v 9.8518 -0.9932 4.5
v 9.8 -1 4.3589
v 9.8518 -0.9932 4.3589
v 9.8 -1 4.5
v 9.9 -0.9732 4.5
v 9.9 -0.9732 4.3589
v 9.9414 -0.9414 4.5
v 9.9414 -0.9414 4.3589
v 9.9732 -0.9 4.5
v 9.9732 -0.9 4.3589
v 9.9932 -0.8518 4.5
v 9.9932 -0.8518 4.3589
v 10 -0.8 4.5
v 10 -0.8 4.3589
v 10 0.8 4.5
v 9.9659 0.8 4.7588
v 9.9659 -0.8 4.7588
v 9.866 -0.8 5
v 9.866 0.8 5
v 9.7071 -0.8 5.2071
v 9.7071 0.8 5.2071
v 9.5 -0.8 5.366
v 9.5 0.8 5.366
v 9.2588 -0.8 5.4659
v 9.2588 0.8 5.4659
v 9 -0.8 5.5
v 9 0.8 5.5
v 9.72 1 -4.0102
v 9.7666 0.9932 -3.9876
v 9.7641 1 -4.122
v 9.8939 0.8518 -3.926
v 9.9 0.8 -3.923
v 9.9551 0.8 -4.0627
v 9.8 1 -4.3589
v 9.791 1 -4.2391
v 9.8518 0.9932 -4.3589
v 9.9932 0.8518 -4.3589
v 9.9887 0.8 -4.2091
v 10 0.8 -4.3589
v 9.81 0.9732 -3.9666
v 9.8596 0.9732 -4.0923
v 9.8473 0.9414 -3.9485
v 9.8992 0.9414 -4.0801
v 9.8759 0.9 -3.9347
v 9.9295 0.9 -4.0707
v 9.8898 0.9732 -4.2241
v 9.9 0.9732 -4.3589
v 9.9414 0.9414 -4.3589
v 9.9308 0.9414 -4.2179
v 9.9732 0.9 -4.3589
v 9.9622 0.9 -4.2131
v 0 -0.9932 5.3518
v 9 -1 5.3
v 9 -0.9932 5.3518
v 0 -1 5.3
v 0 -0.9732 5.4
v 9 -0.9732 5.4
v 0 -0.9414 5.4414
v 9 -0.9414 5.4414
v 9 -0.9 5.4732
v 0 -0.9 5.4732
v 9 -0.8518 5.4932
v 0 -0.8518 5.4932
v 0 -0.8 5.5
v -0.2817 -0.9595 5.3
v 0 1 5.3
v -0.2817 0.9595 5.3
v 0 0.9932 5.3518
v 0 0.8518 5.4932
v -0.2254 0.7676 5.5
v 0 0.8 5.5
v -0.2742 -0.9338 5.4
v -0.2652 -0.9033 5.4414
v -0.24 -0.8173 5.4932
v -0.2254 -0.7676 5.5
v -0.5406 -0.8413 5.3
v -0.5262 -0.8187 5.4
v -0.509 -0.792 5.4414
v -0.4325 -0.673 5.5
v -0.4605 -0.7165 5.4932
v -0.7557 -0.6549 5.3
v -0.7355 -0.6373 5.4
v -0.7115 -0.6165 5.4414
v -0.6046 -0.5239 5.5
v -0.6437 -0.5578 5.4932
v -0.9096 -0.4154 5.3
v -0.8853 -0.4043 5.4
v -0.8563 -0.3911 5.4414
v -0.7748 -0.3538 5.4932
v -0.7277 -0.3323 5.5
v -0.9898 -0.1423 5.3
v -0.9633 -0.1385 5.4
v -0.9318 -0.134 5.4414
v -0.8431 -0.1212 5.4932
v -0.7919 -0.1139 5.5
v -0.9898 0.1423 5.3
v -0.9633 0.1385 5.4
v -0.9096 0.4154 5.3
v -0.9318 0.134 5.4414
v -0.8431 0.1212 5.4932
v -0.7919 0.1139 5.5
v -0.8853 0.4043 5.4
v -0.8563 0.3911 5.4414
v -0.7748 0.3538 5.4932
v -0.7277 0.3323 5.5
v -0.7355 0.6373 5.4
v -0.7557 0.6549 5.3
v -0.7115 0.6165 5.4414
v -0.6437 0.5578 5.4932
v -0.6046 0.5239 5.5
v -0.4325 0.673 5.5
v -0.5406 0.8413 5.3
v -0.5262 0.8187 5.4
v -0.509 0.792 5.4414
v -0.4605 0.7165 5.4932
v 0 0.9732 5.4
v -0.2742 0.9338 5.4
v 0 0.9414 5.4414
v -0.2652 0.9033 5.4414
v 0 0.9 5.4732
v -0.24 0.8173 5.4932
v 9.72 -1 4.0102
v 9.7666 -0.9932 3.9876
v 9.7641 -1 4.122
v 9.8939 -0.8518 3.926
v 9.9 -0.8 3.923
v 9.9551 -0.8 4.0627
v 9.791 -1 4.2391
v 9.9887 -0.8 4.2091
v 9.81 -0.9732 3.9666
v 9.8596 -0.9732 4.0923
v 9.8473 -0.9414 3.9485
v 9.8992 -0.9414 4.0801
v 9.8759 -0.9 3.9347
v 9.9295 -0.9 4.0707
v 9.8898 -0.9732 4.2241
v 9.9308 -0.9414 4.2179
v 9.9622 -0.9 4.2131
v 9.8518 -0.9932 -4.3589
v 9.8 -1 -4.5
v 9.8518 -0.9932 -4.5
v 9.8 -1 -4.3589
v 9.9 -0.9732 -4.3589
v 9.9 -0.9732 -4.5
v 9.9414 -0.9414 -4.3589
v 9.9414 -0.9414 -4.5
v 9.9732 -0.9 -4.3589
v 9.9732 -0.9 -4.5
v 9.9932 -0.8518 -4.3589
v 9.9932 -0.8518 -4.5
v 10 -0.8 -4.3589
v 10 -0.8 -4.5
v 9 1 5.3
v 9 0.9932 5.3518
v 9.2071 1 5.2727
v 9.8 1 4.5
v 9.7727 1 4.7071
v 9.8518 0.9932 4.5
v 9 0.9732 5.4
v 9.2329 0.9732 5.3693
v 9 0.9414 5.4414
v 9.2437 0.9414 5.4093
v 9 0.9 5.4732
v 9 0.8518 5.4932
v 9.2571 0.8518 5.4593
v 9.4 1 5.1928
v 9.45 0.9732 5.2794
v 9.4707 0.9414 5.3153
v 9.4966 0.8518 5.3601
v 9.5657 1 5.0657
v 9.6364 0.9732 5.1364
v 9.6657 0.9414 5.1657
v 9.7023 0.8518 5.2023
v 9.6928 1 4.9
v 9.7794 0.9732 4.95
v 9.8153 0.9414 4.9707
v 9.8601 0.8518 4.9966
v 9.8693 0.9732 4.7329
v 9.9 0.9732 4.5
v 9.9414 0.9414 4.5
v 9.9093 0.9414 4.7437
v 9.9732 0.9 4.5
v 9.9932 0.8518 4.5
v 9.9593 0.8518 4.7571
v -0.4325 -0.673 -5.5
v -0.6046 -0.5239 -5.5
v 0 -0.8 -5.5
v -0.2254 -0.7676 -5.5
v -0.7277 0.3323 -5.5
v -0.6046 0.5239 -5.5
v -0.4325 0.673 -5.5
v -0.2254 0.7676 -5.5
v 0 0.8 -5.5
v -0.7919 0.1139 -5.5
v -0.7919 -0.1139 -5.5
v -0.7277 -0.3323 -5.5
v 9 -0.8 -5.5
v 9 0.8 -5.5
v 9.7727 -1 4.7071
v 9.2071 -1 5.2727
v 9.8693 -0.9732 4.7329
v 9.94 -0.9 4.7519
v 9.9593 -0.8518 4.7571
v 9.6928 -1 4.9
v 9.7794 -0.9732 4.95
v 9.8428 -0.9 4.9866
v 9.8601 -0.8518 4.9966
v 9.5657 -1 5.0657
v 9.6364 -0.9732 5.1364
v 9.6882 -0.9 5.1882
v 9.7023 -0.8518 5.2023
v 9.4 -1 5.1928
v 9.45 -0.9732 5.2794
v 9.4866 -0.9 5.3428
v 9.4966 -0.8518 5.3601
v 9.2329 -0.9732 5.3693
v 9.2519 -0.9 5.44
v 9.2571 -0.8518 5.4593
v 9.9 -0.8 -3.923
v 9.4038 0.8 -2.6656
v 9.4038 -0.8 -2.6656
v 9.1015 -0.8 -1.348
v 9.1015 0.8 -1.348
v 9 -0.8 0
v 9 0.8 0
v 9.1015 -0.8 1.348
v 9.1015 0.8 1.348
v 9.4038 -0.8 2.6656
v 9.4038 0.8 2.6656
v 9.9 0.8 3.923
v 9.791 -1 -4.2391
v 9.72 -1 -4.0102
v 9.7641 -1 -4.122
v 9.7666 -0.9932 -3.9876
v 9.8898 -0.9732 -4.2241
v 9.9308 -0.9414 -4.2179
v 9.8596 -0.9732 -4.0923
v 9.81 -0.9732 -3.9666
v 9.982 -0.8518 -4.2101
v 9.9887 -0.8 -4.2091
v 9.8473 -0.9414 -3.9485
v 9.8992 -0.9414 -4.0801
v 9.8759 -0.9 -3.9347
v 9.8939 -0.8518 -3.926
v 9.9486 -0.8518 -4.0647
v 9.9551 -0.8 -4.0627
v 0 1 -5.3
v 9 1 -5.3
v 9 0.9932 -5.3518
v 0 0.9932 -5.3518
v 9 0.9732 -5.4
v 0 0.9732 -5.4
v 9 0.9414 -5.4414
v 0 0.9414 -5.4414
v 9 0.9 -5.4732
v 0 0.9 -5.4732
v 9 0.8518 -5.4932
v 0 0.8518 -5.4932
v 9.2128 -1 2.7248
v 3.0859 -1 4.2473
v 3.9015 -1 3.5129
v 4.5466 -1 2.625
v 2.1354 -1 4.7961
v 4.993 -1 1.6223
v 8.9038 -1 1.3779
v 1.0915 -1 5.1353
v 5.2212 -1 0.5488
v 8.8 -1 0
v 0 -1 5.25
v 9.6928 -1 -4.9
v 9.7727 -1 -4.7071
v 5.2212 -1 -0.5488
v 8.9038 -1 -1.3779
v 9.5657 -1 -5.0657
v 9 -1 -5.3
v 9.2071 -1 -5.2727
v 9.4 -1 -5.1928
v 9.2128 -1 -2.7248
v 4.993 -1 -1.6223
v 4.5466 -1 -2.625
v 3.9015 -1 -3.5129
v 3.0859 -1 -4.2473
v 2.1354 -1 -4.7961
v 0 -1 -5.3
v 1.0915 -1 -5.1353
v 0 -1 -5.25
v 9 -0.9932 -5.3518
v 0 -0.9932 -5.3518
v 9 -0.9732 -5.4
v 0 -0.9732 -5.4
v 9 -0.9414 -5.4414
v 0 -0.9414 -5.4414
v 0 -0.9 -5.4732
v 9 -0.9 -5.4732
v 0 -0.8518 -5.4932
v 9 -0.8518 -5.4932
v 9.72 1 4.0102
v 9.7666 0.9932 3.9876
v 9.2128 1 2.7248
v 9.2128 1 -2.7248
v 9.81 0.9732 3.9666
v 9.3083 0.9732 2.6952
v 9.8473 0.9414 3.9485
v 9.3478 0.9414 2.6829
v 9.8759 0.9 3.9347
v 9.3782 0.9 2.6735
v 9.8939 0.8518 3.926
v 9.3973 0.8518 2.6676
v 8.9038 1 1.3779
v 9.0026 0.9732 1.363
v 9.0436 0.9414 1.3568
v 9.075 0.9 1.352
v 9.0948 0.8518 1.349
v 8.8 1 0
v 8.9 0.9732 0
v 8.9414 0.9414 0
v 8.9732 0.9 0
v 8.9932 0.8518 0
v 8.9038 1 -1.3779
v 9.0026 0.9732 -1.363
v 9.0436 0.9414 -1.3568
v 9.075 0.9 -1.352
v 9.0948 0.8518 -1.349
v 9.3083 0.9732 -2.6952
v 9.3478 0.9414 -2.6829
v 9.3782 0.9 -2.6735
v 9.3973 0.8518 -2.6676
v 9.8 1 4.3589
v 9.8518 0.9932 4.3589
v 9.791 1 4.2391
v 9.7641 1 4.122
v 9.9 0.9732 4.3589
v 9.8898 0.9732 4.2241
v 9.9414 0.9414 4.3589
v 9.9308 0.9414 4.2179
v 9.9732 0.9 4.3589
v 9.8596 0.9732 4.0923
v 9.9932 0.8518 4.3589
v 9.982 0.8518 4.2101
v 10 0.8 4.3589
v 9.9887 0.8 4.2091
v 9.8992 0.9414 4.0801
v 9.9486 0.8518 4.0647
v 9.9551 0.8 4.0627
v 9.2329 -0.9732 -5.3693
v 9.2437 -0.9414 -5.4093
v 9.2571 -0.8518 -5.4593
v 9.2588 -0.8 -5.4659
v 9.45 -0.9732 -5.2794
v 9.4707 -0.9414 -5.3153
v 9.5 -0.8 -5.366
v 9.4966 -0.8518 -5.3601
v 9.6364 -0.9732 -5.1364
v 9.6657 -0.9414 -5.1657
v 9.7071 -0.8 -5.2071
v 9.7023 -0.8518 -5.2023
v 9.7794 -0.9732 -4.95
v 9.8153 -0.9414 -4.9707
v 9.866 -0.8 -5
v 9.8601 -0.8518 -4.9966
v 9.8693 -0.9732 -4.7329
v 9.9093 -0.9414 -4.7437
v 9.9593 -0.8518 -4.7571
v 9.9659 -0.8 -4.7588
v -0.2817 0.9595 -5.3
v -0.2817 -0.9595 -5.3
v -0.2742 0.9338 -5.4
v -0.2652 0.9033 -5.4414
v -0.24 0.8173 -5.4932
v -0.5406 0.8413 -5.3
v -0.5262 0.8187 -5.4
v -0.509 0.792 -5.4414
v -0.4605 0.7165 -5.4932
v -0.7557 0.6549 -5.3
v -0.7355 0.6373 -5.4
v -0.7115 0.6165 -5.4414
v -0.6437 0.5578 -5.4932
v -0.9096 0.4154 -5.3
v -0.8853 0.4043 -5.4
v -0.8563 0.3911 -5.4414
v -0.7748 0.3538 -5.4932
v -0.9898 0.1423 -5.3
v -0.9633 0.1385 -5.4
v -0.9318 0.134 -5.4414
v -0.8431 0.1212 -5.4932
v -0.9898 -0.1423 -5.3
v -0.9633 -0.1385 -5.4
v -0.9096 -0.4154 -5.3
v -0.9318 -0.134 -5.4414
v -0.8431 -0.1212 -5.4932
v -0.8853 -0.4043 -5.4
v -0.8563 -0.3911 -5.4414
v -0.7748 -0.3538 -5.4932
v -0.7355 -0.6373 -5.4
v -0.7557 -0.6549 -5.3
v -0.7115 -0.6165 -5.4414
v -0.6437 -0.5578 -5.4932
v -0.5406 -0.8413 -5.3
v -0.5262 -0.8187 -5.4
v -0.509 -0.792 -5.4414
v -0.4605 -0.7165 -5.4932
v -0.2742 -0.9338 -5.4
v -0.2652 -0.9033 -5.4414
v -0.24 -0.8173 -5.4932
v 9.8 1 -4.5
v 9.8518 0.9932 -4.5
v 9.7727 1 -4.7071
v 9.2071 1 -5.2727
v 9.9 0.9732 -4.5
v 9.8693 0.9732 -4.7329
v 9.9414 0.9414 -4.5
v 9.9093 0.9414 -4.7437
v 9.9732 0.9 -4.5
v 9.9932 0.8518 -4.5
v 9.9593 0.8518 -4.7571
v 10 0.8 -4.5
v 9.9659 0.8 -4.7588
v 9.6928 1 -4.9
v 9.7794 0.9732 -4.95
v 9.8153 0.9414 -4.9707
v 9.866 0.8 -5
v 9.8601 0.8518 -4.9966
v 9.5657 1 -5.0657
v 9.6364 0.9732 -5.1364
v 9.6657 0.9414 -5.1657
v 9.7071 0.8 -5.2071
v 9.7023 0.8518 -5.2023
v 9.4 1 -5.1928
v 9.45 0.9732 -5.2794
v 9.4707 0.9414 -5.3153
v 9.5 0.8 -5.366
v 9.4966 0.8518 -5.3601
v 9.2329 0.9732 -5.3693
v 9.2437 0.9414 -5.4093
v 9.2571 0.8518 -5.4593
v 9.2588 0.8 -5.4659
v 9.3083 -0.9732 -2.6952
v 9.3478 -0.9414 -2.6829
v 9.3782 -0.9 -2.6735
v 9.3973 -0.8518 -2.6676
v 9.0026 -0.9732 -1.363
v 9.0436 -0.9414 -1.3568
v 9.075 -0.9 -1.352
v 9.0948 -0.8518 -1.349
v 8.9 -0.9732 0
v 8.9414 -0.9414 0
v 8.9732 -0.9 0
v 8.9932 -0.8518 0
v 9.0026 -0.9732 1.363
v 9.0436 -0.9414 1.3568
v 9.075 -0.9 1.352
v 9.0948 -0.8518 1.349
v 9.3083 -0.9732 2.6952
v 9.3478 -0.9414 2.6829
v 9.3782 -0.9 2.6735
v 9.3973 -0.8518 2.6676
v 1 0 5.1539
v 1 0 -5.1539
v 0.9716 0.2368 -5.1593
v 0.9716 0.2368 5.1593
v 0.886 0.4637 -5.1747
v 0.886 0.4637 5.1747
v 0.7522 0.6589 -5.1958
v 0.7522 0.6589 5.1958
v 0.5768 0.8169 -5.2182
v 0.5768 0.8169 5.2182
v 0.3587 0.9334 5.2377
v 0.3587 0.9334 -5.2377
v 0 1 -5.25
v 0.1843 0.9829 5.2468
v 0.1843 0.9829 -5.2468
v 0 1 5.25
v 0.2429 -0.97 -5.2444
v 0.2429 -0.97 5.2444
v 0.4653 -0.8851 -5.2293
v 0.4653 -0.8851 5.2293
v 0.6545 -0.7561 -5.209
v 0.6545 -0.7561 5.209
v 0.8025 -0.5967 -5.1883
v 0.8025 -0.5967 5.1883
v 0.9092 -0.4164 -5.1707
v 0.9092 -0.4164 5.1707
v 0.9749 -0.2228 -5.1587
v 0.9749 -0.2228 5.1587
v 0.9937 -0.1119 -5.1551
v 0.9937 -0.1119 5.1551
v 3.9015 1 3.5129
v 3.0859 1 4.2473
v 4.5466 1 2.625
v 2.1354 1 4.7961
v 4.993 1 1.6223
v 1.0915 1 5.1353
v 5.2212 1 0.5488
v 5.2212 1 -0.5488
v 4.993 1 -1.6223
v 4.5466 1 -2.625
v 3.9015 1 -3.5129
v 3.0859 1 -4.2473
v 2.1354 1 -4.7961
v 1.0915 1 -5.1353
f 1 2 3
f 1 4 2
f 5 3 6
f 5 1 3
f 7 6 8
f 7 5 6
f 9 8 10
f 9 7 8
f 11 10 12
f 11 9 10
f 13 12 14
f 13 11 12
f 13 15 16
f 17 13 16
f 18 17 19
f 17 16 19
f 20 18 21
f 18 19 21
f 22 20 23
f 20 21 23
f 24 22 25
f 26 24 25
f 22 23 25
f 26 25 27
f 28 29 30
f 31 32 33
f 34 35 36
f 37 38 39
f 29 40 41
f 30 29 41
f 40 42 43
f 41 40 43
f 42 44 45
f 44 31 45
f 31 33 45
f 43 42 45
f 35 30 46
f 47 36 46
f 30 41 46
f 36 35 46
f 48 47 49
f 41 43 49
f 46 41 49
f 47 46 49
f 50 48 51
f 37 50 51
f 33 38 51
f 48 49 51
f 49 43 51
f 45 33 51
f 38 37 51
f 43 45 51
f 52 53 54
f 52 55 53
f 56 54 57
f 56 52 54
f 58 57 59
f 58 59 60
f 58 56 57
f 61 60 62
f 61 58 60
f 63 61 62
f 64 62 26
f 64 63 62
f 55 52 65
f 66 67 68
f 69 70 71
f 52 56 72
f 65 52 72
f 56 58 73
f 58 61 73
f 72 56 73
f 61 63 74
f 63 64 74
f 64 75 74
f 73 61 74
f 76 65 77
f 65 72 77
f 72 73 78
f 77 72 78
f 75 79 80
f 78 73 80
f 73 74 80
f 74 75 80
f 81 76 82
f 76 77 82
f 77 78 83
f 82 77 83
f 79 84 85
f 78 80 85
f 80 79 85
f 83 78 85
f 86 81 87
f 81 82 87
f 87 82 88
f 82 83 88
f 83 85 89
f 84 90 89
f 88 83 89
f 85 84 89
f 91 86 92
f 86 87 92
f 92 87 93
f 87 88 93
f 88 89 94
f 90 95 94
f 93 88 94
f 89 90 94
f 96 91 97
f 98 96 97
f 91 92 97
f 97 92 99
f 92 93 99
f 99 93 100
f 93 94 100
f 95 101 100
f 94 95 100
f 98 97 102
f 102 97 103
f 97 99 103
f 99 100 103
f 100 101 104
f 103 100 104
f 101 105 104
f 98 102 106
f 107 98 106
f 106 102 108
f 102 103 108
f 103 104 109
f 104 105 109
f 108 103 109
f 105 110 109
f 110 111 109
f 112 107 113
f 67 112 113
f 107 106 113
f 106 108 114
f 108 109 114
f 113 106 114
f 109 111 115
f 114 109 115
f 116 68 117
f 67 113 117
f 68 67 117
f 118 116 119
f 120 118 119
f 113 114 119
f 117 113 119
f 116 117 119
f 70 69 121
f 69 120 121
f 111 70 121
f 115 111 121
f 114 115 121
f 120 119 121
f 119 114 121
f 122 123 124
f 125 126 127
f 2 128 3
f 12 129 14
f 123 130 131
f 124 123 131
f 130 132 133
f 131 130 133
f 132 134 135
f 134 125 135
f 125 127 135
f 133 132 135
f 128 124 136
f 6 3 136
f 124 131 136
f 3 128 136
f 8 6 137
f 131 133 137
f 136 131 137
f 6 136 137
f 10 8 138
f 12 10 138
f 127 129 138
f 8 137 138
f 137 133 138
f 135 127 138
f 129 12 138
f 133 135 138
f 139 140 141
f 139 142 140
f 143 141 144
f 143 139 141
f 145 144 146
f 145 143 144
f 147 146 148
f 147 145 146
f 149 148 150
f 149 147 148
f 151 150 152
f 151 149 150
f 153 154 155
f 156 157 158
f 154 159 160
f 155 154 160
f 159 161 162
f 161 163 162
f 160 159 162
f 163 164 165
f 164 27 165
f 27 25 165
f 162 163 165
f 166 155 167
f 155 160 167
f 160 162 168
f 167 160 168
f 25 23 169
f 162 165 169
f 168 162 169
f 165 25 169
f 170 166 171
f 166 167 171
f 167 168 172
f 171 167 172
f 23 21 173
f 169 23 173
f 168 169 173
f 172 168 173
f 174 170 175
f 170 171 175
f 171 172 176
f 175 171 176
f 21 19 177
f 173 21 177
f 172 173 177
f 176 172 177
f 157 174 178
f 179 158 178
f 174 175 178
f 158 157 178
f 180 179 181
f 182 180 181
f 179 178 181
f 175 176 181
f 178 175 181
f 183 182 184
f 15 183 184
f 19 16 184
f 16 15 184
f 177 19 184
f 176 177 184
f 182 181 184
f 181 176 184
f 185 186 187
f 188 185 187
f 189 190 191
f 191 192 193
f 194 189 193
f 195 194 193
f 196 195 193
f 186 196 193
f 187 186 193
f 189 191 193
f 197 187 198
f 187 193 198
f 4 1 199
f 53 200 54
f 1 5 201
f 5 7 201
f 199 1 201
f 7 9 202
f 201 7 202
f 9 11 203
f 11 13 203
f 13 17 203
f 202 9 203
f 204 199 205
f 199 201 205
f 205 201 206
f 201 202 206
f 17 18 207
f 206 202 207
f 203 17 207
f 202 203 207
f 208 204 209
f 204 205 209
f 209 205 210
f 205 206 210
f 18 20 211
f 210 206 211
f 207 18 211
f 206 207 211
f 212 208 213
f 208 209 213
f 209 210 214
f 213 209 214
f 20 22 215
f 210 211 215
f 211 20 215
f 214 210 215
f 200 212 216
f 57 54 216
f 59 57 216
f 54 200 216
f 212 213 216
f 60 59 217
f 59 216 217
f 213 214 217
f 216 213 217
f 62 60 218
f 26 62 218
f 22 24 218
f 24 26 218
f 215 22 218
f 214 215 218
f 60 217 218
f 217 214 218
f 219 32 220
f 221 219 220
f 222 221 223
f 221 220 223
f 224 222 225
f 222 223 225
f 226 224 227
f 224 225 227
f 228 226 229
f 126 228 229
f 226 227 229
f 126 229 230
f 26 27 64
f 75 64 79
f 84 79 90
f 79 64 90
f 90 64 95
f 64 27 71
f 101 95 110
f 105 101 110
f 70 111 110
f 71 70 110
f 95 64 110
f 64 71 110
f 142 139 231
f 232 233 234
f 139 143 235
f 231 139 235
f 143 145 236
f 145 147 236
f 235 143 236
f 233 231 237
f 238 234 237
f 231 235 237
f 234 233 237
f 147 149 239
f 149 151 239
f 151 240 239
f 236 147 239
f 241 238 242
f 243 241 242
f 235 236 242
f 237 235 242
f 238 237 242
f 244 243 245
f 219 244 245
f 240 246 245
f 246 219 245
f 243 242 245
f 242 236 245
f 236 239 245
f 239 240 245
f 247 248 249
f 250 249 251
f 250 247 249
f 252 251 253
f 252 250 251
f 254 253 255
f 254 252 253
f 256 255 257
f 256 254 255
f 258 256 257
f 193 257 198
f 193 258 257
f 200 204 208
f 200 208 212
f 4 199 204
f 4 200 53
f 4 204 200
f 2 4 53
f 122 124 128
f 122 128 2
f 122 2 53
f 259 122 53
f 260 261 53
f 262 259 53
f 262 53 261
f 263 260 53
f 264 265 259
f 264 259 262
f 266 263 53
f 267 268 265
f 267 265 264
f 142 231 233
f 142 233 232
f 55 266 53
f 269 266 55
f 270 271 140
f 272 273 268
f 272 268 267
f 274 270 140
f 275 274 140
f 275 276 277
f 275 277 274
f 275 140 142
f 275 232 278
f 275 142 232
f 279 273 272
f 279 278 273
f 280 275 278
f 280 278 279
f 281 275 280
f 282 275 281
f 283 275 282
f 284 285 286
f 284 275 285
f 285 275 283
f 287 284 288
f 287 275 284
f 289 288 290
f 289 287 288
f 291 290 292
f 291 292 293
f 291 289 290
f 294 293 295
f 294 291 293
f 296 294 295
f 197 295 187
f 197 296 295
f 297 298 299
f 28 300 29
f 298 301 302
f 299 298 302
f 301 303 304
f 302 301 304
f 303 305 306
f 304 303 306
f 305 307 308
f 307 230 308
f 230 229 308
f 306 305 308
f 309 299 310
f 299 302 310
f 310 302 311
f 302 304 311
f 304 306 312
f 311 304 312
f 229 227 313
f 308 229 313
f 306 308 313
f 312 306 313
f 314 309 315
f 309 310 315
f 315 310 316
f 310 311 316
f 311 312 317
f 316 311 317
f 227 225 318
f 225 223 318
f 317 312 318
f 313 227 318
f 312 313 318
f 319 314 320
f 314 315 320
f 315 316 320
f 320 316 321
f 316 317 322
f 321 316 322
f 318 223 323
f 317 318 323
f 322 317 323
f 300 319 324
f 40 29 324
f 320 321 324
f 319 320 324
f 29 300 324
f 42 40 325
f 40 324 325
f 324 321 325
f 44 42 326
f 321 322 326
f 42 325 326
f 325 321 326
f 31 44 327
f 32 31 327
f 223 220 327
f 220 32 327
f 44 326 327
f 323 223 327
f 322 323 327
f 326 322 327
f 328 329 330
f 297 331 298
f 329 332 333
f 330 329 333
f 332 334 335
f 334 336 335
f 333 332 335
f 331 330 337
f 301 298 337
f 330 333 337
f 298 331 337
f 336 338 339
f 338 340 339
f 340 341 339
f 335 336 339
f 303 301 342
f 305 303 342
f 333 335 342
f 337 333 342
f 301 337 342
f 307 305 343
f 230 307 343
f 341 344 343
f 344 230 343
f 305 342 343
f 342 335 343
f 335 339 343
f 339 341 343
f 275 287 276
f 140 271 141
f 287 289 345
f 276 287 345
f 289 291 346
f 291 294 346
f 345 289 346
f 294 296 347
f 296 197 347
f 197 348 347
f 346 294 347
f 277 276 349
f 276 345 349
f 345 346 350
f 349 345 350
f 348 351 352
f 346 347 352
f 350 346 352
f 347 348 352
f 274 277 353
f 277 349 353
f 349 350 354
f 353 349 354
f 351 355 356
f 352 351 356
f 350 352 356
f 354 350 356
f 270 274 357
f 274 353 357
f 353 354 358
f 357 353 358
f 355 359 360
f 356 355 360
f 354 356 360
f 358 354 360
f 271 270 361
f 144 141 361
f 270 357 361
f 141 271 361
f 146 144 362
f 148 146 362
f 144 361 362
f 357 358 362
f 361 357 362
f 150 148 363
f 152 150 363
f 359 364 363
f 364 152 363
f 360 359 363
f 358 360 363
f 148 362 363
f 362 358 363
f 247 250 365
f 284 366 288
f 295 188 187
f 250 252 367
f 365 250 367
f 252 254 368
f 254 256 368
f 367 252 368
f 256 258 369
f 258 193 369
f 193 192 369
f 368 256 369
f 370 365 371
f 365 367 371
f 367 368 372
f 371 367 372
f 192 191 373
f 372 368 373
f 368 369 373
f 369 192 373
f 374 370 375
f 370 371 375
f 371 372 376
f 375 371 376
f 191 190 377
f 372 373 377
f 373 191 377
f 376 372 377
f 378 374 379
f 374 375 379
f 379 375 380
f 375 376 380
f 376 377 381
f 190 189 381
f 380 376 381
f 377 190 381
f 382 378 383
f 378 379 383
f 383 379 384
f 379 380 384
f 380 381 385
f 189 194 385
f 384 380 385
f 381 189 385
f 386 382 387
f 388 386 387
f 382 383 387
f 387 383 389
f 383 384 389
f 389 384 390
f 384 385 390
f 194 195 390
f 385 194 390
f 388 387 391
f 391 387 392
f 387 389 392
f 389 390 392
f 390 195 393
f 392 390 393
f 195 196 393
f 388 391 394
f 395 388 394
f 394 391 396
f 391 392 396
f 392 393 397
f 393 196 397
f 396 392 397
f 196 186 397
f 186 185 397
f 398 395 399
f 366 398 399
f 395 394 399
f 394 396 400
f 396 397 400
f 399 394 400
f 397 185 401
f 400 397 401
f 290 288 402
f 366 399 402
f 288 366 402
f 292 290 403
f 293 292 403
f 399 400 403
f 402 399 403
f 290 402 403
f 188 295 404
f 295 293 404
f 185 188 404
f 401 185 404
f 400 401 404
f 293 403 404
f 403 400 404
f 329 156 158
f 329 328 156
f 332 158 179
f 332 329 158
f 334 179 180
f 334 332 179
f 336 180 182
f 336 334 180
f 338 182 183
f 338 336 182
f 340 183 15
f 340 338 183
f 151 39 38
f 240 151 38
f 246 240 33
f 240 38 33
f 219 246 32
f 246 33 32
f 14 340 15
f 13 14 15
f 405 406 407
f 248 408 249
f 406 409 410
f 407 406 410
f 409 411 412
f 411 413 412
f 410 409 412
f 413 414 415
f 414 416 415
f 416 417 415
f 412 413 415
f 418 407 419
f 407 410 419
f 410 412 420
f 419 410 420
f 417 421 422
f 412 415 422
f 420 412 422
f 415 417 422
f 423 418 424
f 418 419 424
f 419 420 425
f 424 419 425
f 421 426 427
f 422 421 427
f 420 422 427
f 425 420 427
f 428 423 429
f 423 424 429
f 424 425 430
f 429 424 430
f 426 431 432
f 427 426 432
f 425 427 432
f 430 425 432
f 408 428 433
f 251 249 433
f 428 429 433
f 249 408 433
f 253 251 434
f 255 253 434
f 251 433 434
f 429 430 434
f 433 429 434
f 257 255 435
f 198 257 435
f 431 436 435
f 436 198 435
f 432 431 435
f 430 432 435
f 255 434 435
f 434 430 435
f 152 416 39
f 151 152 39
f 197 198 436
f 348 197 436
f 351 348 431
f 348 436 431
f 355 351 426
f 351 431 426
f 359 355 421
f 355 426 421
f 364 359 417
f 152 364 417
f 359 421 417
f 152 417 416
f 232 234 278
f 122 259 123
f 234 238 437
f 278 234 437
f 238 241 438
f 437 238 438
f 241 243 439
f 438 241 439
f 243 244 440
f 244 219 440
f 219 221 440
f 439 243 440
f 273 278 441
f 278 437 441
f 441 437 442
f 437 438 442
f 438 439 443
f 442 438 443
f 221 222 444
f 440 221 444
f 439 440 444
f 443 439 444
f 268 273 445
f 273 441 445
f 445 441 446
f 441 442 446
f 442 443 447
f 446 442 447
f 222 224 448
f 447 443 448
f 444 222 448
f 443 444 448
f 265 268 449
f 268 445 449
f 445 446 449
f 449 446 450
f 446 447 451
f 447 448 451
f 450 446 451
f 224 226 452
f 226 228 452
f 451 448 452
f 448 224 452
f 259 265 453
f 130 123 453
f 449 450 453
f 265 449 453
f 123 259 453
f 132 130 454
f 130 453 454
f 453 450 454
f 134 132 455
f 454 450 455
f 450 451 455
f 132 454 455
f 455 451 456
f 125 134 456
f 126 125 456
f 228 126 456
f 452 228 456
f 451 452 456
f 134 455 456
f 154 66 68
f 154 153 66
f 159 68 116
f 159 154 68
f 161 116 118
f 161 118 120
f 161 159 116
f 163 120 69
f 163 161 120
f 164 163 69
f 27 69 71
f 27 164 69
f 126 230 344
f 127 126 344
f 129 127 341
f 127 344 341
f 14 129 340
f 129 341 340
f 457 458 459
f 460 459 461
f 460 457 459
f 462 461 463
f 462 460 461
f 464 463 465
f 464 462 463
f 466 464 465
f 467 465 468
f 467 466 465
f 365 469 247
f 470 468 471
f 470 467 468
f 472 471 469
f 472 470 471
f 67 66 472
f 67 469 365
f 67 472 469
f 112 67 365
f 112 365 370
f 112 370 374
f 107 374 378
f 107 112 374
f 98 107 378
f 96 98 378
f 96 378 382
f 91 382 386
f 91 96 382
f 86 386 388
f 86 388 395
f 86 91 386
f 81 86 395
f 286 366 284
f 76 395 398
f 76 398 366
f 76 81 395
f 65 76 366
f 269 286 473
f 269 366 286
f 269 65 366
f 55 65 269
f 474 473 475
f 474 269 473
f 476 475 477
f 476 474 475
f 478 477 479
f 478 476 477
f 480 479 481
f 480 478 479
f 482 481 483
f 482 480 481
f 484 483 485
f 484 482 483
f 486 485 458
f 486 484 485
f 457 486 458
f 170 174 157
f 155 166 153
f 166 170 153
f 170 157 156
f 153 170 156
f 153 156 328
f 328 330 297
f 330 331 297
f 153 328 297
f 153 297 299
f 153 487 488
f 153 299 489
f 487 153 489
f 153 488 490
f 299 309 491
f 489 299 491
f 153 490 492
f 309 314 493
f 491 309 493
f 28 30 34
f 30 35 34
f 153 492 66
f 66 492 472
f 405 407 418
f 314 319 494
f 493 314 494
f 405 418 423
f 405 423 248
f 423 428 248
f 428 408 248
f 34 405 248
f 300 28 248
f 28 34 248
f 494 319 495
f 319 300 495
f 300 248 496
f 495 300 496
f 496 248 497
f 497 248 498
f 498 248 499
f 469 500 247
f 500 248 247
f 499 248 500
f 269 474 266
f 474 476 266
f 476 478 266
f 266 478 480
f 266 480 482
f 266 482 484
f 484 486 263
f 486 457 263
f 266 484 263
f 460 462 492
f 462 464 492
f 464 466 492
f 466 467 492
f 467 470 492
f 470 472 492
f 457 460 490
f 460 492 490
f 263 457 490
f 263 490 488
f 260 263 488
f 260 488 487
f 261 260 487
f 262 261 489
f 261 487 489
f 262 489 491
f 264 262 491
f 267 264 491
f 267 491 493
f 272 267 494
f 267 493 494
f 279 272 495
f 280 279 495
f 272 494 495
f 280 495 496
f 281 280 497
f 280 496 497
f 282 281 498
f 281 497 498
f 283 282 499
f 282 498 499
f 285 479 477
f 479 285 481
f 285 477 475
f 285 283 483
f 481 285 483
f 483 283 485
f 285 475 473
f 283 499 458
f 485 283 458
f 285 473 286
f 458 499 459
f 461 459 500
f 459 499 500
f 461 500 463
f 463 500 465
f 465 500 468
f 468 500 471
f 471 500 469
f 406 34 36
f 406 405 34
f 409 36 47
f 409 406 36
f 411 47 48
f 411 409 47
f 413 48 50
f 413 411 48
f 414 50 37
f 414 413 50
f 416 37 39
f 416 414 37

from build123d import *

# Parameters (mm, degrees)
SKETCH1_R           = 1
BOSS_EXTRUDE1_DEPTH = 5.5
BOSS_EXTRUDE2_DEPTH = 1
FILLET1_R           = 0.2


with BuildPart() as part:
    # Sketch1 → Boss-Extrude1 (new, symmetric)
    with BuildSketch(Plane.XY):
        Circle(SKETCH1_R)
    extrude(amount=BOSS_EXTRUDE1_DEPTH, both=True)

    # Sketch2 → Boss-Extrude2 (add, symmetric)
    with BuildSketch(Plane(origin=(0, 0, 0), x_dir=(1, 0, 0), z_dir=(0, 1, 0))):
        with BuildLine():
            Line((0, 5.5), (9, 5.5))
            ThreePointArc((9, 5.5), (9.707106781, 5.207106781), (10, 4.5))
            Line((10, 4.5), (10, 4.358898944))
            ThreePointArc((10, 4.358898944), (9.974679434, 4.135292146), (9.9, 3.923009049))
            ThreePointArc((9.9, 3.923009049), (9, 0), (9.9, -3.923009049))
            ThreePointArc((9.9, -3.923009049), (9.974679434, -4.135292146), (10, -4.358898944))
            Line((10, -4.358898944), (10, -4.5))
            ThreePointArc((10, -4.5), (9.707106781, -5.207106781), (9, -5.5))
            Line((9, -5.5), (0, -5.5))
            Line((0, -5.5), (0, -5.25))
            ThreePointArc((0, -5.25), (5.25, 0), (0, 5.25))
            Line((0, 5.25), (0, 5.5))
        make_face()
    extrude(amount=BOSS_EXTRUDE2_DEPTH, both=True)

    # Fillet1
    fillet1_edges = [part.edges().sort_by_distance(p)[0] for p in [
        (4.5, -1, 5.5),
        (9.707106781, -1, 5.207106781),
        (10, -1, 4.429449472),
        (9.974679434, -1, 4.135292146),
        (9, -1, 0),
        (9.974679434, -1, -4.135292146),
        (10, -1, -4.429449472),
        (9.707106781, -1, -5.207106781),
        (4.5, -1, -5.5),
        (4.5, 1, 5.5),
        (9.707106781, 1, 5.207106781),
        (10, 1, 4.429449472),
        (9.974679434, 1, 4.135292146),
        (9, 1, 0),
        (9.974679434, 1, -4.135292146),
        (10, 1, -4.429449472),
        (-1, 0, -5.5),
        (9.707106781, 1, -5.207106781),
        (4.5, 1, -5.5),
        (-1, 0, 5.5),
    ]]
    fillet(fillet1_edges, radius=FILLET1_R)


solid = part.part
